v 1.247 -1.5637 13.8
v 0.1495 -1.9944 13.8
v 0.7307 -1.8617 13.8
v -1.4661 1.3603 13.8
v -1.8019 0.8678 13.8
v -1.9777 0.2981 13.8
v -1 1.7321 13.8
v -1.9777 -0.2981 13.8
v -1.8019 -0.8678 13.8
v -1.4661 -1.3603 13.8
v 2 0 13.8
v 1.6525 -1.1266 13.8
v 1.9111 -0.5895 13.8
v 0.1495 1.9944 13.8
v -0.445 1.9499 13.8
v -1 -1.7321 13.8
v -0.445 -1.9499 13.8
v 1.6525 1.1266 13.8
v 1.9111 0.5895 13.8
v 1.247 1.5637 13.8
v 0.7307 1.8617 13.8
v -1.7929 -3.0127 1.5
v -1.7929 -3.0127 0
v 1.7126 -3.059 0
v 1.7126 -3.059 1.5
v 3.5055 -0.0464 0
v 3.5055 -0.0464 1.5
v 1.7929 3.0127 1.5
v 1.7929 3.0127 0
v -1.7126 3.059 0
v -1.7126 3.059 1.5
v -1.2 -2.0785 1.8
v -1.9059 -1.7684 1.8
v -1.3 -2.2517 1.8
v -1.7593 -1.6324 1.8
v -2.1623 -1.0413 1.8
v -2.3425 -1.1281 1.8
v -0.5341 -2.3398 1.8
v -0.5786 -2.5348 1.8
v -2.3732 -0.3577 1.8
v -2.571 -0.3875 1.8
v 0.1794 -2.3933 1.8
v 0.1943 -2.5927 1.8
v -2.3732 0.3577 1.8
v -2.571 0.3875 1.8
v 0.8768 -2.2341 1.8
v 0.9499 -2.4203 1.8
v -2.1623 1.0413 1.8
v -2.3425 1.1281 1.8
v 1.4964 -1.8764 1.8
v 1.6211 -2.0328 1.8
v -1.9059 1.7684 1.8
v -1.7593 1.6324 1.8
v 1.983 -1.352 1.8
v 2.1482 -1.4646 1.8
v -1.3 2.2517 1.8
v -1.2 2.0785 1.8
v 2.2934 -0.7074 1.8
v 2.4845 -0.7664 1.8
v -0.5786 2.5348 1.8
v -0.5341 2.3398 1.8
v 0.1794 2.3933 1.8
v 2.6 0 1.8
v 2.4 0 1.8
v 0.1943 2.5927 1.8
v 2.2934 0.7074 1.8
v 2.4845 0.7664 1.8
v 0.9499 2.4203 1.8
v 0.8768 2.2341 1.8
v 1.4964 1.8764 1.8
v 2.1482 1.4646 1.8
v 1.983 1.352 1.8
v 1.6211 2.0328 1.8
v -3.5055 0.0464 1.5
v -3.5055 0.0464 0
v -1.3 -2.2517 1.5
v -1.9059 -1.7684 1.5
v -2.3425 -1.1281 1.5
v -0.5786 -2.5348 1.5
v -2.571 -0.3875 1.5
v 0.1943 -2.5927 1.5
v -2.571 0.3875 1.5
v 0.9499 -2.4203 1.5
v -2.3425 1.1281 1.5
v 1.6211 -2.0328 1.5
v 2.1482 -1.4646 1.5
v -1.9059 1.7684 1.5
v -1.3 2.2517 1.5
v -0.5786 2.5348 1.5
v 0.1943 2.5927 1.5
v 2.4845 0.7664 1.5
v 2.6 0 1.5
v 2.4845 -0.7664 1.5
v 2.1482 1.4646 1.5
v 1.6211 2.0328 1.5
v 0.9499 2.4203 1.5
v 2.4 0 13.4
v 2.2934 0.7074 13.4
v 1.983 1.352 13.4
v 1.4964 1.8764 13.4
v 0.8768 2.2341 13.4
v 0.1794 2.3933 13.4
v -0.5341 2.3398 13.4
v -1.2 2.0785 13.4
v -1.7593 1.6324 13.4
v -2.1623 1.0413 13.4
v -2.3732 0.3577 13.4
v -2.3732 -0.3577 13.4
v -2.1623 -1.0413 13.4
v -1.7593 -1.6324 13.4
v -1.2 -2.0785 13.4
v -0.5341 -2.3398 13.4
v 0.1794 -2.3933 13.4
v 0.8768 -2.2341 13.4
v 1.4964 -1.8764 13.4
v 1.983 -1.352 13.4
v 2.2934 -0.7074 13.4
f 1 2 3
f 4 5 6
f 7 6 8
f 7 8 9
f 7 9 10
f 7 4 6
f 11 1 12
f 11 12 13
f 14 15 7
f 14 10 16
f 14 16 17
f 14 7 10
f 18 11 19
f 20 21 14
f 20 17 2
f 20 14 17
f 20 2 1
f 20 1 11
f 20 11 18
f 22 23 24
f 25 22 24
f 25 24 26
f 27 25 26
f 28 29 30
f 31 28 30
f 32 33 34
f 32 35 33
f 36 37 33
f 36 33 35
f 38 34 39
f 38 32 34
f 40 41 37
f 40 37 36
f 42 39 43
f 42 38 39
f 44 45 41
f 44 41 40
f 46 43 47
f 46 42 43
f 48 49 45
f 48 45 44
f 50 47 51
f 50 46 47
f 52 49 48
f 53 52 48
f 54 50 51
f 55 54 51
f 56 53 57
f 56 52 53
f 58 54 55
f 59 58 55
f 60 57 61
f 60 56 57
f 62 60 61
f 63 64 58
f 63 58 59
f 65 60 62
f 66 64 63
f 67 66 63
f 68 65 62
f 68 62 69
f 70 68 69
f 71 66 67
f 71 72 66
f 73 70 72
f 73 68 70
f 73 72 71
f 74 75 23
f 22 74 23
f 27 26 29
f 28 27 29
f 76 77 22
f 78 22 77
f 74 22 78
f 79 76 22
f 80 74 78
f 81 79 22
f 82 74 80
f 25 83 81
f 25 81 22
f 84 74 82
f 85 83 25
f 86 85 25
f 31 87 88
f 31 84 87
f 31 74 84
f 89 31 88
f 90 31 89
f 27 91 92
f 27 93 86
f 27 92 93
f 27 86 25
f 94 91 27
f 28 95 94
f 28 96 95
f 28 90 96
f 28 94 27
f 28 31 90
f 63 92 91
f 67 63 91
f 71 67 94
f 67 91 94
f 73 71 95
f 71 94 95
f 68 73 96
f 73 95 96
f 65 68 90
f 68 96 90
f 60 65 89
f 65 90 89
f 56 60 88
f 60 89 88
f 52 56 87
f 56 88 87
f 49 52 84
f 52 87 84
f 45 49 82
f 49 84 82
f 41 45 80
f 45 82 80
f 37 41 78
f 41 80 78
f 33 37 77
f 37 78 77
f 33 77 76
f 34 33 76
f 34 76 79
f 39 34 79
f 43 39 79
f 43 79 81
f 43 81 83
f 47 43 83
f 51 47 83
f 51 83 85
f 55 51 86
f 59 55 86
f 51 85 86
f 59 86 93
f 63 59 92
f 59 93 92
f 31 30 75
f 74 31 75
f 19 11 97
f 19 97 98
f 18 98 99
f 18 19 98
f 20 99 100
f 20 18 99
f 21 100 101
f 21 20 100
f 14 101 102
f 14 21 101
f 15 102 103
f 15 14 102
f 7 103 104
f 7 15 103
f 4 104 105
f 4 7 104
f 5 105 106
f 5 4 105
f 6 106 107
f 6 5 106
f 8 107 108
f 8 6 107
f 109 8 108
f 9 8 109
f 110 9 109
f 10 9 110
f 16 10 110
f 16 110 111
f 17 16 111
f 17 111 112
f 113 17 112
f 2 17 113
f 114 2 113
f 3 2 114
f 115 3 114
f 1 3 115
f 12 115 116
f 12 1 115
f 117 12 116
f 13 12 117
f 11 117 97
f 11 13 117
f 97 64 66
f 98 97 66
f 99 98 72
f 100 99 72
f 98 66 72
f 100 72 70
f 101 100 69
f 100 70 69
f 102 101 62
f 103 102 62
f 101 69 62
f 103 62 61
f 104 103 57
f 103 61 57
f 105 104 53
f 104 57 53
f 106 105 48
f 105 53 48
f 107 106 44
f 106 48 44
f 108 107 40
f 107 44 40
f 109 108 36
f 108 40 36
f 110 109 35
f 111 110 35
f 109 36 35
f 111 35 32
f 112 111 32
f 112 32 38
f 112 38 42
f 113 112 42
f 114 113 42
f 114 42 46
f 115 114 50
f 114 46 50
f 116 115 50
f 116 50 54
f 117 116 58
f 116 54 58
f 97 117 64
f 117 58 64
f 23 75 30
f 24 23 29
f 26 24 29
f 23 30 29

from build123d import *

# Parameters (mm, degrees)
BOSS_EXTRUDE6_DEPTH  = 1.5
SKETCH4_R            = 2.6
BOSS_EXTRUDE7_DEPTH  = 0.3
SKETCH5_R            = 2.4
BOSS_EXTRUDE10_DEPTH = 12
CHAMFER3_SIZE        = 0.4


with BuildPart() as part:
    # Sketch2 → Boss-Extrude6 (new body)
    with BuildSketch(Plane.XY):
        Polygon((1.792912768, 3.012681291), (-1.712602147, 3.05904865), (-3.505514916, 0.046367359), (-1.792912768, -3.012681291), (1.712602147, -3.05904865), (3.505514916, -0.046367359), align=None)
    extrude(amount=BOSS_EXTRUDE6_DEPTH)

    # Sketch4 → Boss-Extrude7 (add)
    with BuildSketch(Plane.XY.offset(1.5)):
        Circle(SKETCH4_R)
    extrude(amount=BOSS_EXTRUDE7_DEPTH)

    # Sketch5 → Boss-Extrude10 (add)
    with BuildSketch(Plane.XY.offset(1.8)):
        Circle(SKETCH5_R)
    extrude(amount=BOSS_EXTRUDE10_DEPTH)

    # Chamfer3
    chamfer3_edges = [part.edges().sort_by_distance(p)[0] for p in [
        (-2.4, 0, 13.8),
    ]]
    chamfer(chamfer3_edges, length=CHAMFER3_SIZE)


solid = part.part
